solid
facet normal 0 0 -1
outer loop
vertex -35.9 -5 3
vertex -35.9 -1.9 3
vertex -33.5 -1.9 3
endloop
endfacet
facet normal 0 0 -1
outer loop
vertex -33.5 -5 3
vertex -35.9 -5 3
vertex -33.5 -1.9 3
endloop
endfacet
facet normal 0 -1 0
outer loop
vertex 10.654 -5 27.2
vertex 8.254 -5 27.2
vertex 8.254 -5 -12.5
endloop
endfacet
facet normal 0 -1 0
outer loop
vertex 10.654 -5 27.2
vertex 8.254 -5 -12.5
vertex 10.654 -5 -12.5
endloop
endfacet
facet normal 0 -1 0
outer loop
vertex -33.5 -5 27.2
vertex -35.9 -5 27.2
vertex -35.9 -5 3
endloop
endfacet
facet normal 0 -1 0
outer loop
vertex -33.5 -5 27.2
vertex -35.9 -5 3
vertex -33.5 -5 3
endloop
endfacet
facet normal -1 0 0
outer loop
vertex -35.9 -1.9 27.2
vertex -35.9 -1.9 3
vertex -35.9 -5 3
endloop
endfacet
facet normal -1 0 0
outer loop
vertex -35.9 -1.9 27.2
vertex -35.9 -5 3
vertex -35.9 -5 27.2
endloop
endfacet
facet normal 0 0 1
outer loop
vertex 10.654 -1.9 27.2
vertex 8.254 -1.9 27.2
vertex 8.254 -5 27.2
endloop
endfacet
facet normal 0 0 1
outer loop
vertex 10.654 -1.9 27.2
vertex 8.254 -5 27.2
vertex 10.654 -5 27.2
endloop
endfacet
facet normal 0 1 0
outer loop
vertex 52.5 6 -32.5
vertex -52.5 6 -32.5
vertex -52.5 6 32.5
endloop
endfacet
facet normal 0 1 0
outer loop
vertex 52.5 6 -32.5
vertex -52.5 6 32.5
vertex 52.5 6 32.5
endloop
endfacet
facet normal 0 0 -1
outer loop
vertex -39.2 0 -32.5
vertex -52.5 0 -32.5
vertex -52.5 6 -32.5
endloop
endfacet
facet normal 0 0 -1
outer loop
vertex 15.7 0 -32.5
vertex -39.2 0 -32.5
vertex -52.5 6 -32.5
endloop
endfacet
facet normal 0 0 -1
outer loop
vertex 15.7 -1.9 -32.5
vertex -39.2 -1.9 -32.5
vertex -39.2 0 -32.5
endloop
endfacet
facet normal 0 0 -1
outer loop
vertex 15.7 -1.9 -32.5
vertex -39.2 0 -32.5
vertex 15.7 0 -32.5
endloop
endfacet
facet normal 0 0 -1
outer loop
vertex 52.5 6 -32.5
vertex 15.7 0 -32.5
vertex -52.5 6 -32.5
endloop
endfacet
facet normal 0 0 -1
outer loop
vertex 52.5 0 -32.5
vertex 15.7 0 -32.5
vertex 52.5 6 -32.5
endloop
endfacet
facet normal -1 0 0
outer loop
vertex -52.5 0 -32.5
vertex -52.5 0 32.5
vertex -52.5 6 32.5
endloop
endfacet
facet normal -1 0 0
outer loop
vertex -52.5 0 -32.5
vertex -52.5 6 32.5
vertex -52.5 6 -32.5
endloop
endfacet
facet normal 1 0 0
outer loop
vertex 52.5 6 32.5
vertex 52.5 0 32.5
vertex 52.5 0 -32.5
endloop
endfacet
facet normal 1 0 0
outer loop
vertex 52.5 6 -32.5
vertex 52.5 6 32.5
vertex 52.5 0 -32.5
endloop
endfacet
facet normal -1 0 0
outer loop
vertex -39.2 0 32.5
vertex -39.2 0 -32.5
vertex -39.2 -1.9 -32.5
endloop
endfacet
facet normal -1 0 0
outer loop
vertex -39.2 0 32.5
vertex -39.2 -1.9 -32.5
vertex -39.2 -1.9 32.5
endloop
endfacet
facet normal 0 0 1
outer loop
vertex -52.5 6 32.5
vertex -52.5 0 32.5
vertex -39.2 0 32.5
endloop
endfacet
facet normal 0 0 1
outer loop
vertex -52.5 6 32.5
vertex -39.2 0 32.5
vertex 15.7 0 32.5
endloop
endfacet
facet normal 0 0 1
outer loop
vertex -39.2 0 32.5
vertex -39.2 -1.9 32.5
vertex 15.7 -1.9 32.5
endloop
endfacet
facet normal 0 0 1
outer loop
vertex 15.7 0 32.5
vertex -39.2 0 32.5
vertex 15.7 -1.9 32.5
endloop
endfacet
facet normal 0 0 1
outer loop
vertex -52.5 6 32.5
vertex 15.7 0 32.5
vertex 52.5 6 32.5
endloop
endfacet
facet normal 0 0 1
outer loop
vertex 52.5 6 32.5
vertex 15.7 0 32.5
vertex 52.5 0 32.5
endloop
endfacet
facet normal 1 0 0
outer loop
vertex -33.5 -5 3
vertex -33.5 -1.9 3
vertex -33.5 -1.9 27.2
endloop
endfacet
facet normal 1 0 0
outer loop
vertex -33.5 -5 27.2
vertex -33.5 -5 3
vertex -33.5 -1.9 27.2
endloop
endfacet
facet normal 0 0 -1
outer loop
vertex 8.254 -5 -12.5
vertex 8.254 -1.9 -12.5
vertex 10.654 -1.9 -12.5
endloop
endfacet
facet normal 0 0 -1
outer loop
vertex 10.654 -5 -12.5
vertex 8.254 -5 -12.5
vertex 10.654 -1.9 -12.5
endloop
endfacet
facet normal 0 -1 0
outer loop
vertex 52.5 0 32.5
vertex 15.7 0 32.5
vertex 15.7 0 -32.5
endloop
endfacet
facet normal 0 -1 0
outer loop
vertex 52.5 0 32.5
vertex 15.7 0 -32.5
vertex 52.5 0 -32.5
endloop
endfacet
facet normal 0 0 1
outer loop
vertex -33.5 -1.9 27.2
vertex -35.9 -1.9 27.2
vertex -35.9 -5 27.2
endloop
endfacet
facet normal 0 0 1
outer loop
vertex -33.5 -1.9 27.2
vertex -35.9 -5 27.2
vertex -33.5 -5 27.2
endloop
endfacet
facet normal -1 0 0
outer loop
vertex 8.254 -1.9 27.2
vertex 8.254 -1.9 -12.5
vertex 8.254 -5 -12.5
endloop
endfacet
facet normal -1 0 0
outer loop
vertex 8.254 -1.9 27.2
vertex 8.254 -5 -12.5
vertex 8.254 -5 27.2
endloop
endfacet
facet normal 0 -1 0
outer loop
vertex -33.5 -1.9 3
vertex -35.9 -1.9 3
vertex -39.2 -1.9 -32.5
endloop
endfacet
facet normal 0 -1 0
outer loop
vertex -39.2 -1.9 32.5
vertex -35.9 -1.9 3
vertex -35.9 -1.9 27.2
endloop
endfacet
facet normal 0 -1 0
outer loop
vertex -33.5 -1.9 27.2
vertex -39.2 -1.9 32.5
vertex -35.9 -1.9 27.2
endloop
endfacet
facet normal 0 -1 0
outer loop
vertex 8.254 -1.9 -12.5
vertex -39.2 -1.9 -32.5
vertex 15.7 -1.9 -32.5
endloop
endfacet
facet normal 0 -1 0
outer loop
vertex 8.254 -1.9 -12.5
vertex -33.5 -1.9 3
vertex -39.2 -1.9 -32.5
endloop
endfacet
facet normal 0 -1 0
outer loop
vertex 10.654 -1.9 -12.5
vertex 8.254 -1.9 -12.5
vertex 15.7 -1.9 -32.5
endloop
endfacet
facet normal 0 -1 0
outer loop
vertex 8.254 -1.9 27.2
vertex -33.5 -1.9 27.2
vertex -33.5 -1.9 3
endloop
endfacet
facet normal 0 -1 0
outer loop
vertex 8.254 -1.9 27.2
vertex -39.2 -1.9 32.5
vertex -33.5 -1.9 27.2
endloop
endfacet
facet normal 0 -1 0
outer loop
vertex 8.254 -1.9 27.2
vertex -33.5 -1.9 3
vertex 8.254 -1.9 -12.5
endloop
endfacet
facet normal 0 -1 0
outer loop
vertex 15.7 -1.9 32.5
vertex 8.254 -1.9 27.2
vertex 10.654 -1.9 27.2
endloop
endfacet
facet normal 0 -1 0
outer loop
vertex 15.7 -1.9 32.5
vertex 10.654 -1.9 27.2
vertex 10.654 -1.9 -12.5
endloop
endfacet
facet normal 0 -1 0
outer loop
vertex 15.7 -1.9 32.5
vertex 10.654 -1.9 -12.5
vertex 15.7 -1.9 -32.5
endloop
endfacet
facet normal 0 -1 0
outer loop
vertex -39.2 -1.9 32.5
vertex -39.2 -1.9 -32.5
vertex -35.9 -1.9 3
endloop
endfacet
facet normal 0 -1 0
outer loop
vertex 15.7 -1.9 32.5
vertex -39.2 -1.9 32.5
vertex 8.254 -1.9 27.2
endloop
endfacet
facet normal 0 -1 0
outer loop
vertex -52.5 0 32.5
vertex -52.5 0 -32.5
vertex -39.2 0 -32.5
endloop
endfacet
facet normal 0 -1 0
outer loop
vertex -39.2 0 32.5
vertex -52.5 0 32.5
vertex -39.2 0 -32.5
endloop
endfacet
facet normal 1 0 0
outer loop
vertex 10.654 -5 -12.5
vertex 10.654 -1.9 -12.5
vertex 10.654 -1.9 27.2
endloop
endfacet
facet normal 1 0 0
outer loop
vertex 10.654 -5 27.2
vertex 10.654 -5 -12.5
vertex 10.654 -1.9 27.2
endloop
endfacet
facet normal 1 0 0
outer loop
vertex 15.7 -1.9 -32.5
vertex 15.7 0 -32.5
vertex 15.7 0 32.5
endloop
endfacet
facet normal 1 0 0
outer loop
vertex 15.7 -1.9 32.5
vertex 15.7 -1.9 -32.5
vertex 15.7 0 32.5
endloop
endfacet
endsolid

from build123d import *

# Parameters (mm, degrees)
SKETCH1_W           = 105
SKETCH1_H           = 65
BOSS_EXTRUDE1_DEPTH = 6
SKETCH3_W           = 54.9
SKETCH3_H           = 65
BOSS_EXTRUDE3_DEPTH = 1.9
SKETCH4_W           = 2.4
SKETCH4_H           = 24.2
SKETCH4_H_2         = 39.7
BOSS_EXTRUDE4_DEPTH = 3.1


with BuildPart() as part:
    # Sketch1 → Boss-Extrude1 (new body)
    with BuildSketch(Plane(origin=(0, 0, 0), x_dir=(1, 0, 0), z_dir=(0, 1, 0))):
        Rectangle(SKETCH1_W, SKETCH1_H)
    extrude(amount=BOSS_EXTRUDE1_DEPTH)

    # Sketch3 → Boss-Extrude3 (add)
    with BuildSketch(Plane.XZ):
        with Locations((-11.75, 0)):
            Rectangle(SKETCH3_W, SKETCH3_H)
    extrude(amount=BOSS_EXTRUDE3_DEPTH)

    # Sketch4 → Boss-Extrude4 (add)
    with BuildSketch(Plane.XZ.offset(1.9)):
        with Locations((-34.7, 15.1)):
            Rectangle(SKETCH4_W, SKETCH4_H)
        with Locations((9.453936311, 7.35)):
            Rectangle(SKETCH4_W, SKETCH4_H_2)
    extrude(amount=BOSS_EXTRUDE4_DEPTH)


solid = part.part
